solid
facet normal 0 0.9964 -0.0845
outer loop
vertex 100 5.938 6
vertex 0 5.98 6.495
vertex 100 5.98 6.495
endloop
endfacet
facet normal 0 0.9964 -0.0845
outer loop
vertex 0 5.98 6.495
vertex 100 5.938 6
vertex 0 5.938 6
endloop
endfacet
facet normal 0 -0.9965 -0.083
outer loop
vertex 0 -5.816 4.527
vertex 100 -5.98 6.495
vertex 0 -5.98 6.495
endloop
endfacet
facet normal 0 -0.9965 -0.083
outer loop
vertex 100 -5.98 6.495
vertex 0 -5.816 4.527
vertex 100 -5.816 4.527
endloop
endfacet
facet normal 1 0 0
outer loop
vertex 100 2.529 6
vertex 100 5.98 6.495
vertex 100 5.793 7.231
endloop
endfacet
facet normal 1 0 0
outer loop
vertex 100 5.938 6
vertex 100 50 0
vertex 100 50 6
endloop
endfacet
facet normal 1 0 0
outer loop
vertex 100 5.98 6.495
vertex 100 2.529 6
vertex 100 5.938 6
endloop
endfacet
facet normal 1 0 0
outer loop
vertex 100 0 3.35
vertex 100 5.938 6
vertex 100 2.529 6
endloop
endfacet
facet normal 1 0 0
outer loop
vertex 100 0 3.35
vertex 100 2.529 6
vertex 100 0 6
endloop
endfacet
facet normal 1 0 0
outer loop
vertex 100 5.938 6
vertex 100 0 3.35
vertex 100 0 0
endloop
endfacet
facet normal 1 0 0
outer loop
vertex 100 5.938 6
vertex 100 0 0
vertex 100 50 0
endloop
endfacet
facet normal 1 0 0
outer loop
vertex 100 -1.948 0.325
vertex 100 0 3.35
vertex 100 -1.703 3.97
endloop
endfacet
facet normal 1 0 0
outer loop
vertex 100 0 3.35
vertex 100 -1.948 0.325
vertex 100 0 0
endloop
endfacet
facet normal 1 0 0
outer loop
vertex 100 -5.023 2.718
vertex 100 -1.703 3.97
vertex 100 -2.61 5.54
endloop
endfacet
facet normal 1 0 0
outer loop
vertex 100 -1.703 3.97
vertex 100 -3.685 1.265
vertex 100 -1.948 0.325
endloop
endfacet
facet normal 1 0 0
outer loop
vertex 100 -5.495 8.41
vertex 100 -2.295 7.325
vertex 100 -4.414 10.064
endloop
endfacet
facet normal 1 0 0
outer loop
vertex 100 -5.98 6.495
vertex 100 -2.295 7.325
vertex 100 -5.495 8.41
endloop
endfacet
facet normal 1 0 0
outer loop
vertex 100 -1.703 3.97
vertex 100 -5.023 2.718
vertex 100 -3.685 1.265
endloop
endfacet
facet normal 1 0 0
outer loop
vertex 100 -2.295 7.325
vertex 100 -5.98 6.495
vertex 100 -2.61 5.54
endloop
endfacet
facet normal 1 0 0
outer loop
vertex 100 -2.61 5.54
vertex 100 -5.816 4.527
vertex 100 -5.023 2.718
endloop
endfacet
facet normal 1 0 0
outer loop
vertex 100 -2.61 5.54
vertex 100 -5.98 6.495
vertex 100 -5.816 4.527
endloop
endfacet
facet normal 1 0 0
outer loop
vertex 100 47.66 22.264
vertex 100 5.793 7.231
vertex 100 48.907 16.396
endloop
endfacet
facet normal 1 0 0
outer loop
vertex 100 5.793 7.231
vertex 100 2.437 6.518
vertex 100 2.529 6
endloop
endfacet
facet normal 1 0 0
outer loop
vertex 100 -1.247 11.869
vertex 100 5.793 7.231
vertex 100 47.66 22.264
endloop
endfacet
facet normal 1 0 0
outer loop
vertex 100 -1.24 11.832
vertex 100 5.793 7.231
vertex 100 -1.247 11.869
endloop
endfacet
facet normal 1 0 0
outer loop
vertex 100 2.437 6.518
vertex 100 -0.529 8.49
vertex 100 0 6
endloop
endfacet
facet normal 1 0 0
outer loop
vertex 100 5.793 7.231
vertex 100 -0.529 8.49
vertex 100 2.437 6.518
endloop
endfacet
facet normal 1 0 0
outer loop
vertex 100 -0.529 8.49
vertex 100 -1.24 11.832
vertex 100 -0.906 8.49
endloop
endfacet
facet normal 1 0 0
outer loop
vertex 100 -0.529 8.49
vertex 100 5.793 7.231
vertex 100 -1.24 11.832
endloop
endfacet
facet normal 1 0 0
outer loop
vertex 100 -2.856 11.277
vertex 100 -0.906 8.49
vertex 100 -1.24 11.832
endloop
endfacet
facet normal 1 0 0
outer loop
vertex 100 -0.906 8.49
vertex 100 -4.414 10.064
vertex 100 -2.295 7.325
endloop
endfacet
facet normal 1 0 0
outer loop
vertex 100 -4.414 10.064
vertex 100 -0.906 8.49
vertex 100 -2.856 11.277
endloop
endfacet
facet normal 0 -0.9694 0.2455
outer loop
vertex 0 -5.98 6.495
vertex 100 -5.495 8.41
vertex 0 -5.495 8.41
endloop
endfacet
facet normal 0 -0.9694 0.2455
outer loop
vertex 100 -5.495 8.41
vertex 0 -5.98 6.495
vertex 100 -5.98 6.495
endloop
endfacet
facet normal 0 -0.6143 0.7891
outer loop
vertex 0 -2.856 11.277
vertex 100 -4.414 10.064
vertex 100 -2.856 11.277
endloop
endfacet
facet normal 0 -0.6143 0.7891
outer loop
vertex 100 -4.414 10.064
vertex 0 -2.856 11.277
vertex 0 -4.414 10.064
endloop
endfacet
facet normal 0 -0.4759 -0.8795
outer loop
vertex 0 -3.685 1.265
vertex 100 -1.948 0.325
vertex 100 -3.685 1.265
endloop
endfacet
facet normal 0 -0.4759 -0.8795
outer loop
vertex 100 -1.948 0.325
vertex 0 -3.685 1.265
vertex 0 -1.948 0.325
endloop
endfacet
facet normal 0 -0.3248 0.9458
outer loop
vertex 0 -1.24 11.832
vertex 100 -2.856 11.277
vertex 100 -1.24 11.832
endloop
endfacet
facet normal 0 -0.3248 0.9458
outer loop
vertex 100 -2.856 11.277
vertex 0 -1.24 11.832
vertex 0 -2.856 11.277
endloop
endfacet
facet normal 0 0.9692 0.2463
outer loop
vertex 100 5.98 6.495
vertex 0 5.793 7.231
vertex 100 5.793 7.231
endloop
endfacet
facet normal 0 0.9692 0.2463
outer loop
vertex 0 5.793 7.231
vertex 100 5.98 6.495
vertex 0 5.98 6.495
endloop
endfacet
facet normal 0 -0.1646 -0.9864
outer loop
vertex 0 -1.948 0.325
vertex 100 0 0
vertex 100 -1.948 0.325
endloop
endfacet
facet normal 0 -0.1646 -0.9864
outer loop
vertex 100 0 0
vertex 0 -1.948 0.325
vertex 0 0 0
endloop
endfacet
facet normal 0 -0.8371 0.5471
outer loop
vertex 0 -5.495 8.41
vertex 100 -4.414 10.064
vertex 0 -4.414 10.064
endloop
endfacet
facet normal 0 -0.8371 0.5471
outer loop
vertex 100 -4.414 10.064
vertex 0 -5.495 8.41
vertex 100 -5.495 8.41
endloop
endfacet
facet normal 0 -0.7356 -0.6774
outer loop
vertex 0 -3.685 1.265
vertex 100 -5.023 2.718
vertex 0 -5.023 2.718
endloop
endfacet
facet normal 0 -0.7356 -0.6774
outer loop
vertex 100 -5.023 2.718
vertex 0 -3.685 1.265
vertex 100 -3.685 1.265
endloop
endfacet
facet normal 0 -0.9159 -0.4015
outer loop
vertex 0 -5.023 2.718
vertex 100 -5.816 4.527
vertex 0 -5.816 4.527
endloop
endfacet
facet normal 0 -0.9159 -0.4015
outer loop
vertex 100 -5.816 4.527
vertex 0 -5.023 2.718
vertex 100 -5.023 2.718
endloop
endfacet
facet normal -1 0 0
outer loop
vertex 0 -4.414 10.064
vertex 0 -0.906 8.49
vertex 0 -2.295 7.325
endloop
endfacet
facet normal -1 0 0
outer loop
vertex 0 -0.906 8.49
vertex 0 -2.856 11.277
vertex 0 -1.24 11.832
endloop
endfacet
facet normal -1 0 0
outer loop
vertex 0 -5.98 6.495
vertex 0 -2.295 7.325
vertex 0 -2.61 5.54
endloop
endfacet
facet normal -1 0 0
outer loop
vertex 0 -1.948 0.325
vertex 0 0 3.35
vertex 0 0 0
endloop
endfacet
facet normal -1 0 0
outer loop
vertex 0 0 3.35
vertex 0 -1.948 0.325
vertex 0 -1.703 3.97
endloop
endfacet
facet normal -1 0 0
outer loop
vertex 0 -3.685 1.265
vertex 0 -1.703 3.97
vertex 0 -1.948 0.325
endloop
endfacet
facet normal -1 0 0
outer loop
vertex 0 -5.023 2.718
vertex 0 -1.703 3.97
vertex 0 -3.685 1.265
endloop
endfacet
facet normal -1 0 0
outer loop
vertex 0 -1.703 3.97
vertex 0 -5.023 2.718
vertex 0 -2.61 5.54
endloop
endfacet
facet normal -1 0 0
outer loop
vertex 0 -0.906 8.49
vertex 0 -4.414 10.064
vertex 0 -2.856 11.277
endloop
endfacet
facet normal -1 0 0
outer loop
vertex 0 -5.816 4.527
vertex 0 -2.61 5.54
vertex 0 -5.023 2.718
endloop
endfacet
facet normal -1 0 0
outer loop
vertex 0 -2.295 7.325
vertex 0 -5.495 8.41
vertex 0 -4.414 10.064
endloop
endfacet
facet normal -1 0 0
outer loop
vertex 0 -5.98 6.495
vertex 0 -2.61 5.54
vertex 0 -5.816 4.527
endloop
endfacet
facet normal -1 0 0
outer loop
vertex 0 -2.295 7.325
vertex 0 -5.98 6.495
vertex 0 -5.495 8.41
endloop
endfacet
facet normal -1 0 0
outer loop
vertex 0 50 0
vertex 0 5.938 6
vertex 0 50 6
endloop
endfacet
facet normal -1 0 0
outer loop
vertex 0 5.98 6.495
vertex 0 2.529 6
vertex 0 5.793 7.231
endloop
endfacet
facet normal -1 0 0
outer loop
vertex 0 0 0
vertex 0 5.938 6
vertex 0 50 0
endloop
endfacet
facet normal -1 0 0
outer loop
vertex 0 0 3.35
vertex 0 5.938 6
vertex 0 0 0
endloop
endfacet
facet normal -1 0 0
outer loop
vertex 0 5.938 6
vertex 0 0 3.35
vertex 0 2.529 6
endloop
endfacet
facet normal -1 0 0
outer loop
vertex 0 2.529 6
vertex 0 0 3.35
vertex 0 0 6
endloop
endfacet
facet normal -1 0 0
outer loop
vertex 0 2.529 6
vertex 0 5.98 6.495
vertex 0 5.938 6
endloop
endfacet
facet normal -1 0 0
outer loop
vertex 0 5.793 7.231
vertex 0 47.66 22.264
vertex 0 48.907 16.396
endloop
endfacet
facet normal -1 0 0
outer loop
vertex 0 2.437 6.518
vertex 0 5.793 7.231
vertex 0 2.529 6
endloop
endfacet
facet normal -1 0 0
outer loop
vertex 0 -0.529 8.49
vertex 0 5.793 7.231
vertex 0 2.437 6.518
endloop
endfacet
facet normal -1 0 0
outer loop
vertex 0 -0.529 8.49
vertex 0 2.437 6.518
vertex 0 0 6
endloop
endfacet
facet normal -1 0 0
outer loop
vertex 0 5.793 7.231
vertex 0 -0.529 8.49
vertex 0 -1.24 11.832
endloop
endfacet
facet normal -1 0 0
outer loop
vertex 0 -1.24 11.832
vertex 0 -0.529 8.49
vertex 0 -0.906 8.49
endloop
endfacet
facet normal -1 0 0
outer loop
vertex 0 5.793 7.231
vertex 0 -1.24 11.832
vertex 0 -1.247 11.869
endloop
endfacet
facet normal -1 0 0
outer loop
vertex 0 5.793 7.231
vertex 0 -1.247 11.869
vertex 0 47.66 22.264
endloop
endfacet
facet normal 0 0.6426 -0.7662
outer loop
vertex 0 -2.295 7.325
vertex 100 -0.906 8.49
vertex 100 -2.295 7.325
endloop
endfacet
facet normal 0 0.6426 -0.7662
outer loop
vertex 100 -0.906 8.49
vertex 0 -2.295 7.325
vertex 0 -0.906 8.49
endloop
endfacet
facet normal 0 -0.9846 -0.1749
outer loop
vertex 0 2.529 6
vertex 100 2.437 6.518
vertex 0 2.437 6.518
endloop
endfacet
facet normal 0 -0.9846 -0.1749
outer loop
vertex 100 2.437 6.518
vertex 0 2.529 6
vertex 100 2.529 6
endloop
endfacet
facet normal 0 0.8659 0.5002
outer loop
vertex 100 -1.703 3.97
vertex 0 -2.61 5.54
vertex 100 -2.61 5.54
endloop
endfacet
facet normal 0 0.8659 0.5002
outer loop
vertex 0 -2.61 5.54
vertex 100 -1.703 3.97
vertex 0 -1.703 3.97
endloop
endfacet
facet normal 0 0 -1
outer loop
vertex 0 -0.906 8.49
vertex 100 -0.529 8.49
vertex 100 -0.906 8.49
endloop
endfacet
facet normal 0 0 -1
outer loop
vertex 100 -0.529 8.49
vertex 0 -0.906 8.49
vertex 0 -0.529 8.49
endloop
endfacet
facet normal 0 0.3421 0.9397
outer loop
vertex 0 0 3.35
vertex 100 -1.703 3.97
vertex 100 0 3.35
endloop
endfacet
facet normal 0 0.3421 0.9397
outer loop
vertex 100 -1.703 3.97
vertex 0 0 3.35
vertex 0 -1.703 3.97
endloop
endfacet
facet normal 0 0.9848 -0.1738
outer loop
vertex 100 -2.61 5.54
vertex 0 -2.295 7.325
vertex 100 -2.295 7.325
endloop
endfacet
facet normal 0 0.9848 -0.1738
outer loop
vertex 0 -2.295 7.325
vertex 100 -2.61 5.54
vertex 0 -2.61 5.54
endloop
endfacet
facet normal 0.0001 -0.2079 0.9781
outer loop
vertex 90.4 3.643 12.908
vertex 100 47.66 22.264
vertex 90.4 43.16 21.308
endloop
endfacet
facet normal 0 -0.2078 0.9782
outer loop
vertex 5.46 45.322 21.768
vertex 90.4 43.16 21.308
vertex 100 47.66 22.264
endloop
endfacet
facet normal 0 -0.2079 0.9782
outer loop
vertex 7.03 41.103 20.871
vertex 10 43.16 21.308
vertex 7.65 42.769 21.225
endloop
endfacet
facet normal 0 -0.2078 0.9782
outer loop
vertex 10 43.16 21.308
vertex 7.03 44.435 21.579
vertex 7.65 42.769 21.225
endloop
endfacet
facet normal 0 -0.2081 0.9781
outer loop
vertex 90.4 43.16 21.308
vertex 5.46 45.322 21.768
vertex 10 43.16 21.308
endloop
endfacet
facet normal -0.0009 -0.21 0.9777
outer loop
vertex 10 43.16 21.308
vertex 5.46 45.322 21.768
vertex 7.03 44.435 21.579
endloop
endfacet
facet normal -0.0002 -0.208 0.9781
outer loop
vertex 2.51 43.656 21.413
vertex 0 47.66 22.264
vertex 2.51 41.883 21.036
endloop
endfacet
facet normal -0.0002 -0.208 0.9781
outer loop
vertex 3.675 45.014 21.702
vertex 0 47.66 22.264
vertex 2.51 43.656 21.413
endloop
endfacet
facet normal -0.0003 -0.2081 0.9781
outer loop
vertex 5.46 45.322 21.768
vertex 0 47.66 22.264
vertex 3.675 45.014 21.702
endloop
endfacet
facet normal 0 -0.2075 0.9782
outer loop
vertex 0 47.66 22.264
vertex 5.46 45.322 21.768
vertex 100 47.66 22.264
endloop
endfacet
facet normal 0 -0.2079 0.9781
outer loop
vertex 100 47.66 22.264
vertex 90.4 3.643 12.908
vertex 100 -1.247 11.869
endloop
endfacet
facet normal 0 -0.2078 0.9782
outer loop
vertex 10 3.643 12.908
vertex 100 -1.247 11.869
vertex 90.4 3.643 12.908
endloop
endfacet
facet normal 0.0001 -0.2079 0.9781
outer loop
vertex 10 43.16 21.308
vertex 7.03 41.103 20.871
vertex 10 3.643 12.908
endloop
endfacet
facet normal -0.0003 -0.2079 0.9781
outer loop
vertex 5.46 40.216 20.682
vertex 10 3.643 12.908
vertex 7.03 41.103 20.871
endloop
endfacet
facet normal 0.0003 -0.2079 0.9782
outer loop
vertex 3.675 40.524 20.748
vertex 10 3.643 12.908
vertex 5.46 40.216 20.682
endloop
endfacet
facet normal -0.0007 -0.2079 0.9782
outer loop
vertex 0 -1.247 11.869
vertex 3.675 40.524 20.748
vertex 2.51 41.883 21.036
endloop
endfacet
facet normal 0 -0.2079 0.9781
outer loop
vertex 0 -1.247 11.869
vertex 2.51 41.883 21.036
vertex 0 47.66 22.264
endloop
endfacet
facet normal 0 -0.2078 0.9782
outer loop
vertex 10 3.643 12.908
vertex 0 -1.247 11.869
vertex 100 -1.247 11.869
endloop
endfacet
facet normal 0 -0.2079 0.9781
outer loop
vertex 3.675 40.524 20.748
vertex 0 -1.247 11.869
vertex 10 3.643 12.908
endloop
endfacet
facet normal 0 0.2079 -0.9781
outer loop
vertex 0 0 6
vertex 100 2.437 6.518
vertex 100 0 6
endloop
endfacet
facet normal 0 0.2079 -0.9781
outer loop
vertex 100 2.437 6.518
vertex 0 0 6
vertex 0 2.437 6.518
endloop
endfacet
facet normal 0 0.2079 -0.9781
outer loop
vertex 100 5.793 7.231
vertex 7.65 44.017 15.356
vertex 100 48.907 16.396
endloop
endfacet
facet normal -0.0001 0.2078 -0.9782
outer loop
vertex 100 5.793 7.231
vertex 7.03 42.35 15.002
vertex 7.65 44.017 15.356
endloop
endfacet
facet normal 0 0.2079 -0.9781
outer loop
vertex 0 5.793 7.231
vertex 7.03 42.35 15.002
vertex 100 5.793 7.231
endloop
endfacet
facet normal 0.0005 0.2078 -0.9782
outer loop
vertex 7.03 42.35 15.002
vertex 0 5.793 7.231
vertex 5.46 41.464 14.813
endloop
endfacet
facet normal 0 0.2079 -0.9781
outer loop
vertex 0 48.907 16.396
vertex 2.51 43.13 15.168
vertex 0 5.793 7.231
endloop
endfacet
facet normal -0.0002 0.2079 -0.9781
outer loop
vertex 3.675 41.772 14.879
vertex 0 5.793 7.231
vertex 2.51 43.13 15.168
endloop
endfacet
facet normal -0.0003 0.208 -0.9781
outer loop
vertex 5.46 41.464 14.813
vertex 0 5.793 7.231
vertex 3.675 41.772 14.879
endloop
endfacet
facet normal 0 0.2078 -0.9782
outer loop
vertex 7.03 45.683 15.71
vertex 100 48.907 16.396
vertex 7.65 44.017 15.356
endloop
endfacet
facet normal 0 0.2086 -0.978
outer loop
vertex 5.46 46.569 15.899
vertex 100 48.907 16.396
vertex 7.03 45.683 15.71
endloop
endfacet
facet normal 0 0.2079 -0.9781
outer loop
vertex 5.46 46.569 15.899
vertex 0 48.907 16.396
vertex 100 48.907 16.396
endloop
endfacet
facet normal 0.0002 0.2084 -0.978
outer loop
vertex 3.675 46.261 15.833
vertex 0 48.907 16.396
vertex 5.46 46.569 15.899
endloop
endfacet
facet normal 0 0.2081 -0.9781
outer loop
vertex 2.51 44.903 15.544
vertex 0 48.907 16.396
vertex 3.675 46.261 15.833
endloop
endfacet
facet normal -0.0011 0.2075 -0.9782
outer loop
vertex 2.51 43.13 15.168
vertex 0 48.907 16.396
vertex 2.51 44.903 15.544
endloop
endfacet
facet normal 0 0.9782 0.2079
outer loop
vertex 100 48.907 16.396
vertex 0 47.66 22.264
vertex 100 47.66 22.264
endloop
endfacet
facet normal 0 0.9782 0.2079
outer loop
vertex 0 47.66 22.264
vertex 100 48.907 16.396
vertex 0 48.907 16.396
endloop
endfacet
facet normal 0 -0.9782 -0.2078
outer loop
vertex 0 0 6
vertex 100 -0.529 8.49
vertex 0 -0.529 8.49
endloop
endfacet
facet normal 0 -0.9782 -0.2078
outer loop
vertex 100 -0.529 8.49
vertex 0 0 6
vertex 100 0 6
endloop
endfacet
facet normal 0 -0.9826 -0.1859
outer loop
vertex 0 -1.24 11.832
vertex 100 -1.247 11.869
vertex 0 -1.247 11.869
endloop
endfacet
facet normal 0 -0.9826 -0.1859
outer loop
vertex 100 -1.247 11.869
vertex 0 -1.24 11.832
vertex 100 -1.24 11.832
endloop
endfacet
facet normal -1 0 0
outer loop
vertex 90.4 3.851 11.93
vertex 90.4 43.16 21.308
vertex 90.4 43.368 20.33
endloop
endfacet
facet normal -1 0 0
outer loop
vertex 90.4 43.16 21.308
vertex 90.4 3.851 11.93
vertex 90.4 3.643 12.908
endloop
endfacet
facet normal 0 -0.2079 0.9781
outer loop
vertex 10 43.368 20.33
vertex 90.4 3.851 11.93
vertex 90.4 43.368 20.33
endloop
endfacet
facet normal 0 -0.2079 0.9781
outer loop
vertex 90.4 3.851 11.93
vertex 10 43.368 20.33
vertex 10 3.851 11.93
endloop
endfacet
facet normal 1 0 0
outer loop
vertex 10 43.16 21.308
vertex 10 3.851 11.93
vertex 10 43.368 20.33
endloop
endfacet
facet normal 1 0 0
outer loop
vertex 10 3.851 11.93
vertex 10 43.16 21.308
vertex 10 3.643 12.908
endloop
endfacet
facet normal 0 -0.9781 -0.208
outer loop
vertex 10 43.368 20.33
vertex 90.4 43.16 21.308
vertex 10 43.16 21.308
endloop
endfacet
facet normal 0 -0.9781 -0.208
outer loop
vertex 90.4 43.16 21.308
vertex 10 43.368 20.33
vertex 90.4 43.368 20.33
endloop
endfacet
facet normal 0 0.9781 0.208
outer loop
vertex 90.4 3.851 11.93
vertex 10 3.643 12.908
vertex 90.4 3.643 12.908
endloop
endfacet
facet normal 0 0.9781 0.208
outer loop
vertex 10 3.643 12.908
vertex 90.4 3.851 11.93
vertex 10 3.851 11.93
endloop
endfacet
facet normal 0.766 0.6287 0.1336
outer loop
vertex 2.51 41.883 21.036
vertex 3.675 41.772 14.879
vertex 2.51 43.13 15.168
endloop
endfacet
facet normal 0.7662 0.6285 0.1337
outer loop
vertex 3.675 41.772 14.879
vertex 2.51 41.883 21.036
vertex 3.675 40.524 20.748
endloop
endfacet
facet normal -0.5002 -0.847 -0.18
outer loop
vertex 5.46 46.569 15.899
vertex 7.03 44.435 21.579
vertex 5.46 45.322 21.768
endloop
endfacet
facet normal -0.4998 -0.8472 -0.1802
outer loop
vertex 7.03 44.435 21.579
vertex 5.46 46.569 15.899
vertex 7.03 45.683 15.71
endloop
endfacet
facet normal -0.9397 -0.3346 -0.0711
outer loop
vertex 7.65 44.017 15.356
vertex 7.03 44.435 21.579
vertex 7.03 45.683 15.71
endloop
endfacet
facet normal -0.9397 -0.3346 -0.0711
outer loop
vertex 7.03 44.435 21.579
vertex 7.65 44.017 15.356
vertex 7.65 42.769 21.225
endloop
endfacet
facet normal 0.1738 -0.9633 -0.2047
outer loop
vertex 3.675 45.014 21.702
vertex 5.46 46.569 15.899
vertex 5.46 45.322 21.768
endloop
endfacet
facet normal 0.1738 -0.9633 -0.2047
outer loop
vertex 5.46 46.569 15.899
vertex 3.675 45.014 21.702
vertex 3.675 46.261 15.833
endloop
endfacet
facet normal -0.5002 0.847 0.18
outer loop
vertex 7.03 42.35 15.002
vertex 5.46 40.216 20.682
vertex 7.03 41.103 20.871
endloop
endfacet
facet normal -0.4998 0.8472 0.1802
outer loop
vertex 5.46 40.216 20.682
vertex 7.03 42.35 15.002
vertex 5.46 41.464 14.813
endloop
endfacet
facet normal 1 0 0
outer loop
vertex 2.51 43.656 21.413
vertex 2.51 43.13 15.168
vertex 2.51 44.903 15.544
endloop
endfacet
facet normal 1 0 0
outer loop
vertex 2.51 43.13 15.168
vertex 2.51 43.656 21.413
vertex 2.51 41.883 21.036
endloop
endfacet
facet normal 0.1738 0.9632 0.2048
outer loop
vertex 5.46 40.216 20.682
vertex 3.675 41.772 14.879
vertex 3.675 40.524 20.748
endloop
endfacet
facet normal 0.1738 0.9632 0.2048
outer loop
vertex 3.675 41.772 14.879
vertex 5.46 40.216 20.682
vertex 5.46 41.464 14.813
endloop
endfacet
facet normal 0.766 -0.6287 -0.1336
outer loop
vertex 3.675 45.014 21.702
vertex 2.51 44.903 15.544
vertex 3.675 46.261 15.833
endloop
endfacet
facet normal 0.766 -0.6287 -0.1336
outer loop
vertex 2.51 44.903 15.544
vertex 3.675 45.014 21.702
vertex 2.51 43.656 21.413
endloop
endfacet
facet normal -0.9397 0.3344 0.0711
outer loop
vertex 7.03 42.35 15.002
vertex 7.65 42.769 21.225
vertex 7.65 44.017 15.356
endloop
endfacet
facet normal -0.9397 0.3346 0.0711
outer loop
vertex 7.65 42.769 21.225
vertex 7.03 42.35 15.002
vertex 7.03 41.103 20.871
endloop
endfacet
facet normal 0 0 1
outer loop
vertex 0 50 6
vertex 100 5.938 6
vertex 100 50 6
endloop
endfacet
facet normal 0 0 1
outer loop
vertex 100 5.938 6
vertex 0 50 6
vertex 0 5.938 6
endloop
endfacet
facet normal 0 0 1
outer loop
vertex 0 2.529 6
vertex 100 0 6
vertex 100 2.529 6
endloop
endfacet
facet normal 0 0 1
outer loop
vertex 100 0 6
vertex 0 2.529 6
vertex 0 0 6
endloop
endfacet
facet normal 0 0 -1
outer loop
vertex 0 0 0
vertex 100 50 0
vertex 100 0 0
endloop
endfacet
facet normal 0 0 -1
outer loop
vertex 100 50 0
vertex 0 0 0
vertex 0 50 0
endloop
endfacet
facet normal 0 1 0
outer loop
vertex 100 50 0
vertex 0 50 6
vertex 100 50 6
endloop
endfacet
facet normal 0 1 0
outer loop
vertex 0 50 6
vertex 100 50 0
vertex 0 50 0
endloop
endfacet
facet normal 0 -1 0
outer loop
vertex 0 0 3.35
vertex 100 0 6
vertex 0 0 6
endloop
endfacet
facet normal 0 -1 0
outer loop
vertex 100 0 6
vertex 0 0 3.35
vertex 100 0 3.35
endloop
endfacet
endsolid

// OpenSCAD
cube([100, 50, 6]);

difference() {
    translate([0, 0, 6]) rotate([0, 90, 0]) cylinder(h=100, d=12);
    translate([-1, 0, 6]) rotate([0, 90, 0]) cylinder(h=110, d=5.3);
}

    translate([0, 0, 6]) rotate([12, 0, 0]) difference() {
        cube([100, 50, 6]);
        translate([10, 5, 5]) cube([80+0.4, 40+0.4, 6]);
        
        translate([5, 45, -1])cylinder(h=20, d=5.3);
    }
